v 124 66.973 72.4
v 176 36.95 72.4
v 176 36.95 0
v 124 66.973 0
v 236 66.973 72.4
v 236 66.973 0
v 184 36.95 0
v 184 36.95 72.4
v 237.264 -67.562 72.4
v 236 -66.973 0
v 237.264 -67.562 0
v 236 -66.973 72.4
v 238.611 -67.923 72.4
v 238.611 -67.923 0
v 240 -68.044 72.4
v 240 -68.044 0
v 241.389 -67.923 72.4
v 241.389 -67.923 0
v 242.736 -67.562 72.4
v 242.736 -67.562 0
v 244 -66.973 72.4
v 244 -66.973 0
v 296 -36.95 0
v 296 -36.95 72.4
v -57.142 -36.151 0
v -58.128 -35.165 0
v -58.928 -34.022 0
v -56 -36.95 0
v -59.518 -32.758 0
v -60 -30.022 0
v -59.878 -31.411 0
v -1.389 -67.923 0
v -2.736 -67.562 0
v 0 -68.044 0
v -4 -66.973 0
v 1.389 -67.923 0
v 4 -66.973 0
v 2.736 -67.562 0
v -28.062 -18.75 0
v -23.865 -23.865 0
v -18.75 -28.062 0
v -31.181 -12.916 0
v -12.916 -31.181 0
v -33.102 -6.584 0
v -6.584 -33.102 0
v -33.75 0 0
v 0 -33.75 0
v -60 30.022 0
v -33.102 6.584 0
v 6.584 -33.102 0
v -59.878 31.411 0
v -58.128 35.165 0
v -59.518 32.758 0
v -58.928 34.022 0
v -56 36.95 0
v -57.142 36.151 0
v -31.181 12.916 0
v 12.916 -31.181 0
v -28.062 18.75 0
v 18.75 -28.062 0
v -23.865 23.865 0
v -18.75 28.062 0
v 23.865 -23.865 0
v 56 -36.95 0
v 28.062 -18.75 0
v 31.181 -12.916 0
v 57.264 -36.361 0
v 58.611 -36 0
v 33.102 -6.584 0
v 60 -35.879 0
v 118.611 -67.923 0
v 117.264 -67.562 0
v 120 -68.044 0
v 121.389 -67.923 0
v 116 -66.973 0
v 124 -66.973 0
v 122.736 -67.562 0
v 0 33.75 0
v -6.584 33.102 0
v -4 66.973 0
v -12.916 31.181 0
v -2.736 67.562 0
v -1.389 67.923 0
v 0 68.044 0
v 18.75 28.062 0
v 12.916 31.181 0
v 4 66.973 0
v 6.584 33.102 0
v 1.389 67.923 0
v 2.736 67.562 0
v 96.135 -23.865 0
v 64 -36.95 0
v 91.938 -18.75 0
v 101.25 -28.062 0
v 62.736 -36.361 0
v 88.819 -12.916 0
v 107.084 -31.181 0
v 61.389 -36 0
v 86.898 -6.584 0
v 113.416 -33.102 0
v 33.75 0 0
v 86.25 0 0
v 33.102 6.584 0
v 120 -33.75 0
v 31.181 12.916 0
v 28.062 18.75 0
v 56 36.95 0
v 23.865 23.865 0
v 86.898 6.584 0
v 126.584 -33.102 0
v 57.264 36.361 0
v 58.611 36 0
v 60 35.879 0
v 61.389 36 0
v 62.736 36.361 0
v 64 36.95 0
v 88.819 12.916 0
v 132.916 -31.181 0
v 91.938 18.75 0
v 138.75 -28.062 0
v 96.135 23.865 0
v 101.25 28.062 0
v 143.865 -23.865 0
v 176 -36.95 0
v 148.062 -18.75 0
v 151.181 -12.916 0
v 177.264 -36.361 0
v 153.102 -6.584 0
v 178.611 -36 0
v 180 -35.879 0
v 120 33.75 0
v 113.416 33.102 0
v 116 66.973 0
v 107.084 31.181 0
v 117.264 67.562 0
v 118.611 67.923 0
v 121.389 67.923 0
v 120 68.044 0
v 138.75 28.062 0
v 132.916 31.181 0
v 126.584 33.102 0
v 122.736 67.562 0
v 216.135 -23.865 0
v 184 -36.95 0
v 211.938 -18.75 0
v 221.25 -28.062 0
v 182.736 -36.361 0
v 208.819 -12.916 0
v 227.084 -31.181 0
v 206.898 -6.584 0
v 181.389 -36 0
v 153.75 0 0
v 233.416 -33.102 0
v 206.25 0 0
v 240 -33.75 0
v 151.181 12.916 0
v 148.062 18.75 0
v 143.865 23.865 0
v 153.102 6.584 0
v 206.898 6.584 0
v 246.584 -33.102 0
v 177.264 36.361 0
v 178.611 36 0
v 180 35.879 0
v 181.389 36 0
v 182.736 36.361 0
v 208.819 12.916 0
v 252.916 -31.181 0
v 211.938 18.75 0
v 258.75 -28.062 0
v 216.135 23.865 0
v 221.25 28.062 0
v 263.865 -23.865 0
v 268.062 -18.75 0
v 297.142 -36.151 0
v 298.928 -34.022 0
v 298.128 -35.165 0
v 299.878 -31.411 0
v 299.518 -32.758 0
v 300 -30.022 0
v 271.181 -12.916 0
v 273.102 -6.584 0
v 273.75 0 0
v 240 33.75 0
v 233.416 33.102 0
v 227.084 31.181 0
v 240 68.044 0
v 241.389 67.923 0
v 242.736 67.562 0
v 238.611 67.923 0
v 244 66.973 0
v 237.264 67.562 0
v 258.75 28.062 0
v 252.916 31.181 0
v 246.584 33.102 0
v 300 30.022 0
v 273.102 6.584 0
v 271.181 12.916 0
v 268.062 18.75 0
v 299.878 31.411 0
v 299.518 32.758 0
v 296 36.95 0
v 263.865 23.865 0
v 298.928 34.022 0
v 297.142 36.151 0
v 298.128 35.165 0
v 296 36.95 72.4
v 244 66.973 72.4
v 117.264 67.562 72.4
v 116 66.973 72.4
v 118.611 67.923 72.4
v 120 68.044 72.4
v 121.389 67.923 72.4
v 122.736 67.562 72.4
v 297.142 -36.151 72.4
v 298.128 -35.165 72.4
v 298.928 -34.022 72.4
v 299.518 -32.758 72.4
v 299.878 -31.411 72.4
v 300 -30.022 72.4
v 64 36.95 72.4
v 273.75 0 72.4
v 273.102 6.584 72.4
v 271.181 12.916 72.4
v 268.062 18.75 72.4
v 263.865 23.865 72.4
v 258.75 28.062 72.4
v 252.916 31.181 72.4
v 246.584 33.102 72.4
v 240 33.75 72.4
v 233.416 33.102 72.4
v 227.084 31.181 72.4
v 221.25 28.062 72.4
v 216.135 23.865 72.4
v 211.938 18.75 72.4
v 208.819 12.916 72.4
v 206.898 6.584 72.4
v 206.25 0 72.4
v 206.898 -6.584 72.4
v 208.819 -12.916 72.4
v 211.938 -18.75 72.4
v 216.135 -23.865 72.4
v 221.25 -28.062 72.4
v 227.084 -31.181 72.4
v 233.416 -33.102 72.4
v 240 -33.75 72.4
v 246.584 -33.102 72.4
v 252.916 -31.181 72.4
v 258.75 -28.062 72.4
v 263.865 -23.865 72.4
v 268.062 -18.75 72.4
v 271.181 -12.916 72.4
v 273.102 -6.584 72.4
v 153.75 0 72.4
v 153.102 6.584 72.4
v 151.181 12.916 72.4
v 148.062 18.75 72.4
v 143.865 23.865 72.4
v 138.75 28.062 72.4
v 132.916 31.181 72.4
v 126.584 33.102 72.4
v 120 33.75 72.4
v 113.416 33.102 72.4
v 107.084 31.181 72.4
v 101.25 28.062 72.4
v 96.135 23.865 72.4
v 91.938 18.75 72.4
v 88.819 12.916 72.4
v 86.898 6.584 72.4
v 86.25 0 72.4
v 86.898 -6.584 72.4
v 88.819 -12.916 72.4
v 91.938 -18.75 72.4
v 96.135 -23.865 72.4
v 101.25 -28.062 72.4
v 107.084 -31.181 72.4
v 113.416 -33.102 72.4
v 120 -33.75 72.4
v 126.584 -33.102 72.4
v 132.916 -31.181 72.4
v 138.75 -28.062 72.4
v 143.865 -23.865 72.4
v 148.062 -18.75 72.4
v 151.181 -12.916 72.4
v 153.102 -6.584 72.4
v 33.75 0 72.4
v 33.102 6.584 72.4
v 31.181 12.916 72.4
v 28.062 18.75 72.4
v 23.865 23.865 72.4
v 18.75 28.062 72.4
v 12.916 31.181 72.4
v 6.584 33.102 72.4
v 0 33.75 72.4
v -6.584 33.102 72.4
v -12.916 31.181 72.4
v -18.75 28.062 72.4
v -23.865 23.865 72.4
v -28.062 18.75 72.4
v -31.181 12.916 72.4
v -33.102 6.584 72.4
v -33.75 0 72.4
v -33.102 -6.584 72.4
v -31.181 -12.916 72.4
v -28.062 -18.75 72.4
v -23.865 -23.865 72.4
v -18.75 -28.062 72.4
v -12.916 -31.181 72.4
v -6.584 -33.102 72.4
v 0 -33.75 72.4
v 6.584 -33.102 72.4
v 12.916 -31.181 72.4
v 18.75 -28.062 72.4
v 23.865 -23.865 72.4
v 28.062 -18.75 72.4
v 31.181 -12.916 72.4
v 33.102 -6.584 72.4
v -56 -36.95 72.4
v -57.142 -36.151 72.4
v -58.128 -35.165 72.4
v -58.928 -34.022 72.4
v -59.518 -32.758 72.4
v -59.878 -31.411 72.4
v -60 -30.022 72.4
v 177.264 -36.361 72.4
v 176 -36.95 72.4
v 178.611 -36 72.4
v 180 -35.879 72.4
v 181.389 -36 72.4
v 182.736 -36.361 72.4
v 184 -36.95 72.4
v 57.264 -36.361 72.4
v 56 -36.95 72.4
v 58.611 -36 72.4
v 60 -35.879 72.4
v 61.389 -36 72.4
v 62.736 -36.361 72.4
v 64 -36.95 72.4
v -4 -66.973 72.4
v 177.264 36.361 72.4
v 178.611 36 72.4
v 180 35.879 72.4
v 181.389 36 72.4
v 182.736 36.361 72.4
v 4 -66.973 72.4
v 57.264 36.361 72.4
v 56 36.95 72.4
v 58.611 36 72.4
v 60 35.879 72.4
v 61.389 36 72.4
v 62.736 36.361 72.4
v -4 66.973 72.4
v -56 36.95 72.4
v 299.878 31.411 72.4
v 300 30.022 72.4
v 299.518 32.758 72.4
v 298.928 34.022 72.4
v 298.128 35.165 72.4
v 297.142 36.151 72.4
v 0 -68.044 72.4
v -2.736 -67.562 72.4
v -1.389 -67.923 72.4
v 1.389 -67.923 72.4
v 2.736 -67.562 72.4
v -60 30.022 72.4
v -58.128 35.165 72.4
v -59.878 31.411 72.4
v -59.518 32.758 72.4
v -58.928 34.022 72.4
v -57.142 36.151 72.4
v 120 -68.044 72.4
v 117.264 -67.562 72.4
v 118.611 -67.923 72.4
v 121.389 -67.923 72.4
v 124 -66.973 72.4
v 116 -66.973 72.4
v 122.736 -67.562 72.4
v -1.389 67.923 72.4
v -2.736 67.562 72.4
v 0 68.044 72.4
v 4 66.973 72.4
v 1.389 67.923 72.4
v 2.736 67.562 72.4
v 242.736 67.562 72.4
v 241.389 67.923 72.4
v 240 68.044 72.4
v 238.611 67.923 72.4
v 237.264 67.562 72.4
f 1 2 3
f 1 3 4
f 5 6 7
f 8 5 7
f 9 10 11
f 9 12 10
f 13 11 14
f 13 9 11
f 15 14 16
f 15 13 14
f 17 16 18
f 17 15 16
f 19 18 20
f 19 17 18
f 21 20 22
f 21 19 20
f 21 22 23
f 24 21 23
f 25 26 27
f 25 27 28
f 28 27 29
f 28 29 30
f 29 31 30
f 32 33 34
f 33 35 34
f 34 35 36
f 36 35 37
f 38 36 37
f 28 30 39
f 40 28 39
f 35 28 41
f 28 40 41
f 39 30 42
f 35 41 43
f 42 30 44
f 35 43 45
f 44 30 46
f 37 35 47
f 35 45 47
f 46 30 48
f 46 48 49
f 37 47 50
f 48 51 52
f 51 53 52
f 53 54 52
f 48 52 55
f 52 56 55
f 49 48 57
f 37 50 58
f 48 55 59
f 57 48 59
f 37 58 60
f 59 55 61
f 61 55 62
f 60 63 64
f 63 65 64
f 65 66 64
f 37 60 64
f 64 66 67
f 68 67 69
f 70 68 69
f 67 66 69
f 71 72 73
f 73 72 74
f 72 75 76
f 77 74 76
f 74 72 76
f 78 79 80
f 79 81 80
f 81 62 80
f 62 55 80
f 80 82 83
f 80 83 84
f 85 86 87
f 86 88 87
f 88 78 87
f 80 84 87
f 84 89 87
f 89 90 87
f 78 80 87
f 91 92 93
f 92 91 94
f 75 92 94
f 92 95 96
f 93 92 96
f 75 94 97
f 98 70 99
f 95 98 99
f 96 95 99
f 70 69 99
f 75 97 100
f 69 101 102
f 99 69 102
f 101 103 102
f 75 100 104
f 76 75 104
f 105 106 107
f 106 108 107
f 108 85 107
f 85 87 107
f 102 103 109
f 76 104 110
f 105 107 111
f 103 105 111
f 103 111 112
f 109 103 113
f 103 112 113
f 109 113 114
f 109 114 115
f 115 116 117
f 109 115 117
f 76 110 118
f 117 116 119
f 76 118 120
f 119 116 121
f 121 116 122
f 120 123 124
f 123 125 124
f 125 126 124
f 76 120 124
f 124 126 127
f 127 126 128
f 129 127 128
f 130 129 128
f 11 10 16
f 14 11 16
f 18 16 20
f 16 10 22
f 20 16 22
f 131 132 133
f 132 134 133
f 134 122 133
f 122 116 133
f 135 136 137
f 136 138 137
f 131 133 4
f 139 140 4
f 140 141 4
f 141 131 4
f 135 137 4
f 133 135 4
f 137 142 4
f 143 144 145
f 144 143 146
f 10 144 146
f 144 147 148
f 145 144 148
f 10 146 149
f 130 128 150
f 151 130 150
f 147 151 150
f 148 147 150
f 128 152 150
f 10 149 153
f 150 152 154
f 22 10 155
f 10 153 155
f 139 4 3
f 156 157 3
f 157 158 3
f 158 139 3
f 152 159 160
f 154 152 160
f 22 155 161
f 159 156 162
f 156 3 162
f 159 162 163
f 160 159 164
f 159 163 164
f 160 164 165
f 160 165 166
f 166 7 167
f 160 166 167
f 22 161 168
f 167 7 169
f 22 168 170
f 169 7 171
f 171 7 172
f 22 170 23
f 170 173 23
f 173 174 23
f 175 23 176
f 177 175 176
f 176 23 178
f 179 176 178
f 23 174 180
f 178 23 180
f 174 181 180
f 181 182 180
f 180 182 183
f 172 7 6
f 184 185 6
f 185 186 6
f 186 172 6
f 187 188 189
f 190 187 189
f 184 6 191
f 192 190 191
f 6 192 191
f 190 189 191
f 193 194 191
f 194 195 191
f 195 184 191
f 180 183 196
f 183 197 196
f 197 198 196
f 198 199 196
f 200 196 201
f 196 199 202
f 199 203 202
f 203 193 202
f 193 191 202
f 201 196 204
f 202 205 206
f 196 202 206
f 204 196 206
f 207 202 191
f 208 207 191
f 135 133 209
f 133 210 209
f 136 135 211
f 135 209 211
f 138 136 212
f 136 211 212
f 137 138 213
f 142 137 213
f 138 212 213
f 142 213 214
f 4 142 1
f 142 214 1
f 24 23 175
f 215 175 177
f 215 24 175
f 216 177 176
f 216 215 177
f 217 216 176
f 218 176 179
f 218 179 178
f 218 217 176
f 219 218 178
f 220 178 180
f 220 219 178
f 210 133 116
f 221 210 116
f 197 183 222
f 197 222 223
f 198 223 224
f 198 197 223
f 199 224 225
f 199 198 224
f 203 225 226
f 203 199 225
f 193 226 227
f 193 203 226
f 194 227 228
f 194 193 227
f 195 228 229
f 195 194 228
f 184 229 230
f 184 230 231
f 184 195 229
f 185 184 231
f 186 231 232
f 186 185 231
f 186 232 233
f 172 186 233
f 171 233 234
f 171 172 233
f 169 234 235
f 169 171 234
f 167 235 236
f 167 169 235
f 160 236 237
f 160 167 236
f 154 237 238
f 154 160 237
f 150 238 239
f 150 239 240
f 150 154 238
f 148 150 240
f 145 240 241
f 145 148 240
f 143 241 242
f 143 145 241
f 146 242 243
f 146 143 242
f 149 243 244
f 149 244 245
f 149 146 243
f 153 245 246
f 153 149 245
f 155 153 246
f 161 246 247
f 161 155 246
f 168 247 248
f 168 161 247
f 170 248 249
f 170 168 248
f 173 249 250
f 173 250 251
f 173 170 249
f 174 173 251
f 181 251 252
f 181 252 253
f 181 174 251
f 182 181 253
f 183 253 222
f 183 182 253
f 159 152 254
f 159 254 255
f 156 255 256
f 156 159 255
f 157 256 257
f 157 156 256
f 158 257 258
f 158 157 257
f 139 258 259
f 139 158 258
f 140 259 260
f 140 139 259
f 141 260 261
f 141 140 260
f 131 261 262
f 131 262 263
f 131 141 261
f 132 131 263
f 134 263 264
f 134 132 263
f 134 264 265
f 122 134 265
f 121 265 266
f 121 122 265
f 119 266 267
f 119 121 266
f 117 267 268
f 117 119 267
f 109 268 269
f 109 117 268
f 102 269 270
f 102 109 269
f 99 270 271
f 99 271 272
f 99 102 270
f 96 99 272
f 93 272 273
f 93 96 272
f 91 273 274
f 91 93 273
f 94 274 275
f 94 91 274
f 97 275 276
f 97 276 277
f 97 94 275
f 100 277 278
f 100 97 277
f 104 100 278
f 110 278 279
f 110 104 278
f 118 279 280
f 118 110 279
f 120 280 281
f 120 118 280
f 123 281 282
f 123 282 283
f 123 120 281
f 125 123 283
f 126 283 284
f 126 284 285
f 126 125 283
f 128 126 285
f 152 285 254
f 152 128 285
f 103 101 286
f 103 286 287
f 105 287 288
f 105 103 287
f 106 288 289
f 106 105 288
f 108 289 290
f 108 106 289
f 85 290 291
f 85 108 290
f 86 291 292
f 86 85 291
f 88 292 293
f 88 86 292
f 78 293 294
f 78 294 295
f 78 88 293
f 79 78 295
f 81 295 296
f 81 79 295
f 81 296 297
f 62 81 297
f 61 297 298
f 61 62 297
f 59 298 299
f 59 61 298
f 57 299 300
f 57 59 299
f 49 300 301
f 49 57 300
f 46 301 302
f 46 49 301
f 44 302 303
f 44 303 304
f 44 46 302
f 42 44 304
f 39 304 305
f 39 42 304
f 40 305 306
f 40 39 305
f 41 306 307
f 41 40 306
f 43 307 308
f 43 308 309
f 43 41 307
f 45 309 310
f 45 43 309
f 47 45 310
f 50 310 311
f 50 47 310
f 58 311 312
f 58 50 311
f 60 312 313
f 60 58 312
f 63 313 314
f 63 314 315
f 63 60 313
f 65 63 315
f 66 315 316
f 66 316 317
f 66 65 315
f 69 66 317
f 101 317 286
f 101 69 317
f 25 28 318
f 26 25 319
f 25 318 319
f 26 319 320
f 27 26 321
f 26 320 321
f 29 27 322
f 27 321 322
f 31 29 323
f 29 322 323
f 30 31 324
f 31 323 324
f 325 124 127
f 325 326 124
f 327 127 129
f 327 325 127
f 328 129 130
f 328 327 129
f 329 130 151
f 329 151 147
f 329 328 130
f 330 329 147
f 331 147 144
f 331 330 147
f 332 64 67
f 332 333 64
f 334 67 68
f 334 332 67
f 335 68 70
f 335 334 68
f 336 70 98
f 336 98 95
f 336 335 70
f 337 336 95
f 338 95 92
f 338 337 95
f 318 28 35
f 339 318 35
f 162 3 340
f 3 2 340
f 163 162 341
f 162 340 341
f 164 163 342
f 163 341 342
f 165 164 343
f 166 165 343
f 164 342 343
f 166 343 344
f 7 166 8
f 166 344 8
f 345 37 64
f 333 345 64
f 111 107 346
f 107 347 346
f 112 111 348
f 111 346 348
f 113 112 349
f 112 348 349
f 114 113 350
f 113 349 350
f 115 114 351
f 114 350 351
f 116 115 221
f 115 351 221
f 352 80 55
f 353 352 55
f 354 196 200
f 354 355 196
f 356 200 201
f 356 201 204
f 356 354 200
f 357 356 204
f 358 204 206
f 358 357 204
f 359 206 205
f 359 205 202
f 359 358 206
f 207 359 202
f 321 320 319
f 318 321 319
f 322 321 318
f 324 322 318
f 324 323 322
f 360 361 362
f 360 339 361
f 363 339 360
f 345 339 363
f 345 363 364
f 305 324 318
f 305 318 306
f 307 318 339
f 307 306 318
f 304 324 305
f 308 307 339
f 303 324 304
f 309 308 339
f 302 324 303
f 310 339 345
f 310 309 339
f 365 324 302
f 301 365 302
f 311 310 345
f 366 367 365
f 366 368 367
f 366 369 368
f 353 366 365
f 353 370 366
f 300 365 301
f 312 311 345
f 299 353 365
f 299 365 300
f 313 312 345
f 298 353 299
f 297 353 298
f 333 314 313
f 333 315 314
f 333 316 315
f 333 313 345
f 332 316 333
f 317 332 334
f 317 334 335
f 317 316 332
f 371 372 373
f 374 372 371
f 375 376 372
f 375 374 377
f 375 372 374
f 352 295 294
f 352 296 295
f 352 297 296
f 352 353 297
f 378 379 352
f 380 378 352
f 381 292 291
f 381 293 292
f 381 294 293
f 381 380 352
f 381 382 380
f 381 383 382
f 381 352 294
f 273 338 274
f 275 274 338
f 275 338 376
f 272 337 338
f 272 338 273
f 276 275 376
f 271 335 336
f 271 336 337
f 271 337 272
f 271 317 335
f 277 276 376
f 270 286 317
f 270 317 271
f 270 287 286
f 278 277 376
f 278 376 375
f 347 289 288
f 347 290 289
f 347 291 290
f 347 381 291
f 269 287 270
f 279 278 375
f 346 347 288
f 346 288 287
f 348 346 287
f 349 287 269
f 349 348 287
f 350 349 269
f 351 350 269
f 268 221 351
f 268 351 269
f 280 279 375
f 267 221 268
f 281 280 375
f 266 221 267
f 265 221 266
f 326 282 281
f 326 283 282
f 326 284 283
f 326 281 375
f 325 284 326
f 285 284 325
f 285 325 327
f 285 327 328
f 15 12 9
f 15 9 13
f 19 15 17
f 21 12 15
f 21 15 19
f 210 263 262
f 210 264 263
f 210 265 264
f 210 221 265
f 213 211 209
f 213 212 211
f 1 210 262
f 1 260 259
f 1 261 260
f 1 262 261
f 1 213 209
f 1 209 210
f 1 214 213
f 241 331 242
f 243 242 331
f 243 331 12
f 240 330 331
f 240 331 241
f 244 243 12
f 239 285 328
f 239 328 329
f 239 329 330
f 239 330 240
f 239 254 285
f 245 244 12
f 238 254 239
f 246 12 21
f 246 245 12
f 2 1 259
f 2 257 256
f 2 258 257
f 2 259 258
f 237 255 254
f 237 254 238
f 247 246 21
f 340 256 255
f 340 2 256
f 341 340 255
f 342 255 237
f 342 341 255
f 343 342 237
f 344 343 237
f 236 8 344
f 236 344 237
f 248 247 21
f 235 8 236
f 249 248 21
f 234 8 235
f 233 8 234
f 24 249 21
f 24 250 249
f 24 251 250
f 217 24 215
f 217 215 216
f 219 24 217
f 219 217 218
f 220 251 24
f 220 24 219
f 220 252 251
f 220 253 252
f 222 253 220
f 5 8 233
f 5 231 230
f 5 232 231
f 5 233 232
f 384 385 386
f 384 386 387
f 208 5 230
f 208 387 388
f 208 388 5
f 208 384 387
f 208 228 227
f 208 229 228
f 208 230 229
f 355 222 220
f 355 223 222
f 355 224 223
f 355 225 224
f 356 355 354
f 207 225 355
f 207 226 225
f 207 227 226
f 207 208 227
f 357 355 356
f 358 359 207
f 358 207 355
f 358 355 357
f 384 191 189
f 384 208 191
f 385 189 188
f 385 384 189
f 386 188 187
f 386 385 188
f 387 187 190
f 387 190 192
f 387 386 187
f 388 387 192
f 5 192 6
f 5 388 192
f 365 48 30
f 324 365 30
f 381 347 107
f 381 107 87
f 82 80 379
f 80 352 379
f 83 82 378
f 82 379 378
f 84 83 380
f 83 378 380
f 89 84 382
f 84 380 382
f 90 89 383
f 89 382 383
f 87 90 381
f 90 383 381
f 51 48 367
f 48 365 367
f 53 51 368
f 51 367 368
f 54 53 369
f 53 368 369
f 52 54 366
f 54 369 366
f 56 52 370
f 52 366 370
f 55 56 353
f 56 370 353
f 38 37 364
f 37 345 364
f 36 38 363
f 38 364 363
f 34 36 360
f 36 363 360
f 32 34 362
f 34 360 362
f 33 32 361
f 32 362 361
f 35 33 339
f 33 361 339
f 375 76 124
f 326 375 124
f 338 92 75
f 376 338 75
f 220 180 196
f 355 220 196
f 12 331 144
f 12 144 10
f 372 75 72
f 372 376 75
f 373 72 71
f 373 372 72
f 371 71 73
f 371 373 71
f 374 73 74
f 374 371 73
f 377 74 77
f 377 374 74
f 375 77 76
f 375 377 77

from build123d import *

# Parameters (mm, degrees)
F0_R     = 33.75
F1_DEPTH = 72.4
F2_R     = 8


with BuildPart() as f1:
    # F0 (on Top) → F1 (new body)
    with BuildSketch(Plane.XY):
        Polygon((0, -69.282032), (60, -34.641016), (60, 34.641016), (0, 69.282032), (-60, 34.641016), (-60, -34.641016), align=None)
        Circle(F0_R, mode=Mode.SUBTRACT)
        Polygon((60, 34.641016), (60, -34.641016), (120, -69.282032), (180, -34.641016), (180, 34.641016), (120, 69.282032), align=None)
        with Locations((120, 0)):
            Circle(F0_R, mode=Mode.SUBTRACT)
        Polygon((180, 34.641016), (180, -34.641016), (240, -69.282032), (300, -34.641016), (300, 34.641016), (240, 69.282032), align=None)
        with Locations((240, 0)):
            Circle(F0_R, mode=Mode.SUBTRACT)
    extrude(amount=F1_DEPTH)

    # F2
    f2_edges = [f1.edges().sort_by_distance(p)[0] for p in [
        (60, -34.641016, 36.2),
        (0, -69.282032, 36.2),
        (-60, -34.641016, 36.2),
        (120, -69.282032, 36.2),
        (180, -34.641016, 36.2),
        (180, 34.641016, 36.2),
        (120, 69.282032, 36.2),
        (0, 69.282032, 36.2),
        (60, 34.641016, 36.2),
        (-60, 34.641016, 36.2),
        (240, -69.282032, 36.2),
        (300, -34.641016, 36.2),
        (300, 34.641016, 36.2),
        (240, 69.282032, 36.2),
    ]]
    fillet(f2_edges, radius=F2_R)


solid = f1.part
